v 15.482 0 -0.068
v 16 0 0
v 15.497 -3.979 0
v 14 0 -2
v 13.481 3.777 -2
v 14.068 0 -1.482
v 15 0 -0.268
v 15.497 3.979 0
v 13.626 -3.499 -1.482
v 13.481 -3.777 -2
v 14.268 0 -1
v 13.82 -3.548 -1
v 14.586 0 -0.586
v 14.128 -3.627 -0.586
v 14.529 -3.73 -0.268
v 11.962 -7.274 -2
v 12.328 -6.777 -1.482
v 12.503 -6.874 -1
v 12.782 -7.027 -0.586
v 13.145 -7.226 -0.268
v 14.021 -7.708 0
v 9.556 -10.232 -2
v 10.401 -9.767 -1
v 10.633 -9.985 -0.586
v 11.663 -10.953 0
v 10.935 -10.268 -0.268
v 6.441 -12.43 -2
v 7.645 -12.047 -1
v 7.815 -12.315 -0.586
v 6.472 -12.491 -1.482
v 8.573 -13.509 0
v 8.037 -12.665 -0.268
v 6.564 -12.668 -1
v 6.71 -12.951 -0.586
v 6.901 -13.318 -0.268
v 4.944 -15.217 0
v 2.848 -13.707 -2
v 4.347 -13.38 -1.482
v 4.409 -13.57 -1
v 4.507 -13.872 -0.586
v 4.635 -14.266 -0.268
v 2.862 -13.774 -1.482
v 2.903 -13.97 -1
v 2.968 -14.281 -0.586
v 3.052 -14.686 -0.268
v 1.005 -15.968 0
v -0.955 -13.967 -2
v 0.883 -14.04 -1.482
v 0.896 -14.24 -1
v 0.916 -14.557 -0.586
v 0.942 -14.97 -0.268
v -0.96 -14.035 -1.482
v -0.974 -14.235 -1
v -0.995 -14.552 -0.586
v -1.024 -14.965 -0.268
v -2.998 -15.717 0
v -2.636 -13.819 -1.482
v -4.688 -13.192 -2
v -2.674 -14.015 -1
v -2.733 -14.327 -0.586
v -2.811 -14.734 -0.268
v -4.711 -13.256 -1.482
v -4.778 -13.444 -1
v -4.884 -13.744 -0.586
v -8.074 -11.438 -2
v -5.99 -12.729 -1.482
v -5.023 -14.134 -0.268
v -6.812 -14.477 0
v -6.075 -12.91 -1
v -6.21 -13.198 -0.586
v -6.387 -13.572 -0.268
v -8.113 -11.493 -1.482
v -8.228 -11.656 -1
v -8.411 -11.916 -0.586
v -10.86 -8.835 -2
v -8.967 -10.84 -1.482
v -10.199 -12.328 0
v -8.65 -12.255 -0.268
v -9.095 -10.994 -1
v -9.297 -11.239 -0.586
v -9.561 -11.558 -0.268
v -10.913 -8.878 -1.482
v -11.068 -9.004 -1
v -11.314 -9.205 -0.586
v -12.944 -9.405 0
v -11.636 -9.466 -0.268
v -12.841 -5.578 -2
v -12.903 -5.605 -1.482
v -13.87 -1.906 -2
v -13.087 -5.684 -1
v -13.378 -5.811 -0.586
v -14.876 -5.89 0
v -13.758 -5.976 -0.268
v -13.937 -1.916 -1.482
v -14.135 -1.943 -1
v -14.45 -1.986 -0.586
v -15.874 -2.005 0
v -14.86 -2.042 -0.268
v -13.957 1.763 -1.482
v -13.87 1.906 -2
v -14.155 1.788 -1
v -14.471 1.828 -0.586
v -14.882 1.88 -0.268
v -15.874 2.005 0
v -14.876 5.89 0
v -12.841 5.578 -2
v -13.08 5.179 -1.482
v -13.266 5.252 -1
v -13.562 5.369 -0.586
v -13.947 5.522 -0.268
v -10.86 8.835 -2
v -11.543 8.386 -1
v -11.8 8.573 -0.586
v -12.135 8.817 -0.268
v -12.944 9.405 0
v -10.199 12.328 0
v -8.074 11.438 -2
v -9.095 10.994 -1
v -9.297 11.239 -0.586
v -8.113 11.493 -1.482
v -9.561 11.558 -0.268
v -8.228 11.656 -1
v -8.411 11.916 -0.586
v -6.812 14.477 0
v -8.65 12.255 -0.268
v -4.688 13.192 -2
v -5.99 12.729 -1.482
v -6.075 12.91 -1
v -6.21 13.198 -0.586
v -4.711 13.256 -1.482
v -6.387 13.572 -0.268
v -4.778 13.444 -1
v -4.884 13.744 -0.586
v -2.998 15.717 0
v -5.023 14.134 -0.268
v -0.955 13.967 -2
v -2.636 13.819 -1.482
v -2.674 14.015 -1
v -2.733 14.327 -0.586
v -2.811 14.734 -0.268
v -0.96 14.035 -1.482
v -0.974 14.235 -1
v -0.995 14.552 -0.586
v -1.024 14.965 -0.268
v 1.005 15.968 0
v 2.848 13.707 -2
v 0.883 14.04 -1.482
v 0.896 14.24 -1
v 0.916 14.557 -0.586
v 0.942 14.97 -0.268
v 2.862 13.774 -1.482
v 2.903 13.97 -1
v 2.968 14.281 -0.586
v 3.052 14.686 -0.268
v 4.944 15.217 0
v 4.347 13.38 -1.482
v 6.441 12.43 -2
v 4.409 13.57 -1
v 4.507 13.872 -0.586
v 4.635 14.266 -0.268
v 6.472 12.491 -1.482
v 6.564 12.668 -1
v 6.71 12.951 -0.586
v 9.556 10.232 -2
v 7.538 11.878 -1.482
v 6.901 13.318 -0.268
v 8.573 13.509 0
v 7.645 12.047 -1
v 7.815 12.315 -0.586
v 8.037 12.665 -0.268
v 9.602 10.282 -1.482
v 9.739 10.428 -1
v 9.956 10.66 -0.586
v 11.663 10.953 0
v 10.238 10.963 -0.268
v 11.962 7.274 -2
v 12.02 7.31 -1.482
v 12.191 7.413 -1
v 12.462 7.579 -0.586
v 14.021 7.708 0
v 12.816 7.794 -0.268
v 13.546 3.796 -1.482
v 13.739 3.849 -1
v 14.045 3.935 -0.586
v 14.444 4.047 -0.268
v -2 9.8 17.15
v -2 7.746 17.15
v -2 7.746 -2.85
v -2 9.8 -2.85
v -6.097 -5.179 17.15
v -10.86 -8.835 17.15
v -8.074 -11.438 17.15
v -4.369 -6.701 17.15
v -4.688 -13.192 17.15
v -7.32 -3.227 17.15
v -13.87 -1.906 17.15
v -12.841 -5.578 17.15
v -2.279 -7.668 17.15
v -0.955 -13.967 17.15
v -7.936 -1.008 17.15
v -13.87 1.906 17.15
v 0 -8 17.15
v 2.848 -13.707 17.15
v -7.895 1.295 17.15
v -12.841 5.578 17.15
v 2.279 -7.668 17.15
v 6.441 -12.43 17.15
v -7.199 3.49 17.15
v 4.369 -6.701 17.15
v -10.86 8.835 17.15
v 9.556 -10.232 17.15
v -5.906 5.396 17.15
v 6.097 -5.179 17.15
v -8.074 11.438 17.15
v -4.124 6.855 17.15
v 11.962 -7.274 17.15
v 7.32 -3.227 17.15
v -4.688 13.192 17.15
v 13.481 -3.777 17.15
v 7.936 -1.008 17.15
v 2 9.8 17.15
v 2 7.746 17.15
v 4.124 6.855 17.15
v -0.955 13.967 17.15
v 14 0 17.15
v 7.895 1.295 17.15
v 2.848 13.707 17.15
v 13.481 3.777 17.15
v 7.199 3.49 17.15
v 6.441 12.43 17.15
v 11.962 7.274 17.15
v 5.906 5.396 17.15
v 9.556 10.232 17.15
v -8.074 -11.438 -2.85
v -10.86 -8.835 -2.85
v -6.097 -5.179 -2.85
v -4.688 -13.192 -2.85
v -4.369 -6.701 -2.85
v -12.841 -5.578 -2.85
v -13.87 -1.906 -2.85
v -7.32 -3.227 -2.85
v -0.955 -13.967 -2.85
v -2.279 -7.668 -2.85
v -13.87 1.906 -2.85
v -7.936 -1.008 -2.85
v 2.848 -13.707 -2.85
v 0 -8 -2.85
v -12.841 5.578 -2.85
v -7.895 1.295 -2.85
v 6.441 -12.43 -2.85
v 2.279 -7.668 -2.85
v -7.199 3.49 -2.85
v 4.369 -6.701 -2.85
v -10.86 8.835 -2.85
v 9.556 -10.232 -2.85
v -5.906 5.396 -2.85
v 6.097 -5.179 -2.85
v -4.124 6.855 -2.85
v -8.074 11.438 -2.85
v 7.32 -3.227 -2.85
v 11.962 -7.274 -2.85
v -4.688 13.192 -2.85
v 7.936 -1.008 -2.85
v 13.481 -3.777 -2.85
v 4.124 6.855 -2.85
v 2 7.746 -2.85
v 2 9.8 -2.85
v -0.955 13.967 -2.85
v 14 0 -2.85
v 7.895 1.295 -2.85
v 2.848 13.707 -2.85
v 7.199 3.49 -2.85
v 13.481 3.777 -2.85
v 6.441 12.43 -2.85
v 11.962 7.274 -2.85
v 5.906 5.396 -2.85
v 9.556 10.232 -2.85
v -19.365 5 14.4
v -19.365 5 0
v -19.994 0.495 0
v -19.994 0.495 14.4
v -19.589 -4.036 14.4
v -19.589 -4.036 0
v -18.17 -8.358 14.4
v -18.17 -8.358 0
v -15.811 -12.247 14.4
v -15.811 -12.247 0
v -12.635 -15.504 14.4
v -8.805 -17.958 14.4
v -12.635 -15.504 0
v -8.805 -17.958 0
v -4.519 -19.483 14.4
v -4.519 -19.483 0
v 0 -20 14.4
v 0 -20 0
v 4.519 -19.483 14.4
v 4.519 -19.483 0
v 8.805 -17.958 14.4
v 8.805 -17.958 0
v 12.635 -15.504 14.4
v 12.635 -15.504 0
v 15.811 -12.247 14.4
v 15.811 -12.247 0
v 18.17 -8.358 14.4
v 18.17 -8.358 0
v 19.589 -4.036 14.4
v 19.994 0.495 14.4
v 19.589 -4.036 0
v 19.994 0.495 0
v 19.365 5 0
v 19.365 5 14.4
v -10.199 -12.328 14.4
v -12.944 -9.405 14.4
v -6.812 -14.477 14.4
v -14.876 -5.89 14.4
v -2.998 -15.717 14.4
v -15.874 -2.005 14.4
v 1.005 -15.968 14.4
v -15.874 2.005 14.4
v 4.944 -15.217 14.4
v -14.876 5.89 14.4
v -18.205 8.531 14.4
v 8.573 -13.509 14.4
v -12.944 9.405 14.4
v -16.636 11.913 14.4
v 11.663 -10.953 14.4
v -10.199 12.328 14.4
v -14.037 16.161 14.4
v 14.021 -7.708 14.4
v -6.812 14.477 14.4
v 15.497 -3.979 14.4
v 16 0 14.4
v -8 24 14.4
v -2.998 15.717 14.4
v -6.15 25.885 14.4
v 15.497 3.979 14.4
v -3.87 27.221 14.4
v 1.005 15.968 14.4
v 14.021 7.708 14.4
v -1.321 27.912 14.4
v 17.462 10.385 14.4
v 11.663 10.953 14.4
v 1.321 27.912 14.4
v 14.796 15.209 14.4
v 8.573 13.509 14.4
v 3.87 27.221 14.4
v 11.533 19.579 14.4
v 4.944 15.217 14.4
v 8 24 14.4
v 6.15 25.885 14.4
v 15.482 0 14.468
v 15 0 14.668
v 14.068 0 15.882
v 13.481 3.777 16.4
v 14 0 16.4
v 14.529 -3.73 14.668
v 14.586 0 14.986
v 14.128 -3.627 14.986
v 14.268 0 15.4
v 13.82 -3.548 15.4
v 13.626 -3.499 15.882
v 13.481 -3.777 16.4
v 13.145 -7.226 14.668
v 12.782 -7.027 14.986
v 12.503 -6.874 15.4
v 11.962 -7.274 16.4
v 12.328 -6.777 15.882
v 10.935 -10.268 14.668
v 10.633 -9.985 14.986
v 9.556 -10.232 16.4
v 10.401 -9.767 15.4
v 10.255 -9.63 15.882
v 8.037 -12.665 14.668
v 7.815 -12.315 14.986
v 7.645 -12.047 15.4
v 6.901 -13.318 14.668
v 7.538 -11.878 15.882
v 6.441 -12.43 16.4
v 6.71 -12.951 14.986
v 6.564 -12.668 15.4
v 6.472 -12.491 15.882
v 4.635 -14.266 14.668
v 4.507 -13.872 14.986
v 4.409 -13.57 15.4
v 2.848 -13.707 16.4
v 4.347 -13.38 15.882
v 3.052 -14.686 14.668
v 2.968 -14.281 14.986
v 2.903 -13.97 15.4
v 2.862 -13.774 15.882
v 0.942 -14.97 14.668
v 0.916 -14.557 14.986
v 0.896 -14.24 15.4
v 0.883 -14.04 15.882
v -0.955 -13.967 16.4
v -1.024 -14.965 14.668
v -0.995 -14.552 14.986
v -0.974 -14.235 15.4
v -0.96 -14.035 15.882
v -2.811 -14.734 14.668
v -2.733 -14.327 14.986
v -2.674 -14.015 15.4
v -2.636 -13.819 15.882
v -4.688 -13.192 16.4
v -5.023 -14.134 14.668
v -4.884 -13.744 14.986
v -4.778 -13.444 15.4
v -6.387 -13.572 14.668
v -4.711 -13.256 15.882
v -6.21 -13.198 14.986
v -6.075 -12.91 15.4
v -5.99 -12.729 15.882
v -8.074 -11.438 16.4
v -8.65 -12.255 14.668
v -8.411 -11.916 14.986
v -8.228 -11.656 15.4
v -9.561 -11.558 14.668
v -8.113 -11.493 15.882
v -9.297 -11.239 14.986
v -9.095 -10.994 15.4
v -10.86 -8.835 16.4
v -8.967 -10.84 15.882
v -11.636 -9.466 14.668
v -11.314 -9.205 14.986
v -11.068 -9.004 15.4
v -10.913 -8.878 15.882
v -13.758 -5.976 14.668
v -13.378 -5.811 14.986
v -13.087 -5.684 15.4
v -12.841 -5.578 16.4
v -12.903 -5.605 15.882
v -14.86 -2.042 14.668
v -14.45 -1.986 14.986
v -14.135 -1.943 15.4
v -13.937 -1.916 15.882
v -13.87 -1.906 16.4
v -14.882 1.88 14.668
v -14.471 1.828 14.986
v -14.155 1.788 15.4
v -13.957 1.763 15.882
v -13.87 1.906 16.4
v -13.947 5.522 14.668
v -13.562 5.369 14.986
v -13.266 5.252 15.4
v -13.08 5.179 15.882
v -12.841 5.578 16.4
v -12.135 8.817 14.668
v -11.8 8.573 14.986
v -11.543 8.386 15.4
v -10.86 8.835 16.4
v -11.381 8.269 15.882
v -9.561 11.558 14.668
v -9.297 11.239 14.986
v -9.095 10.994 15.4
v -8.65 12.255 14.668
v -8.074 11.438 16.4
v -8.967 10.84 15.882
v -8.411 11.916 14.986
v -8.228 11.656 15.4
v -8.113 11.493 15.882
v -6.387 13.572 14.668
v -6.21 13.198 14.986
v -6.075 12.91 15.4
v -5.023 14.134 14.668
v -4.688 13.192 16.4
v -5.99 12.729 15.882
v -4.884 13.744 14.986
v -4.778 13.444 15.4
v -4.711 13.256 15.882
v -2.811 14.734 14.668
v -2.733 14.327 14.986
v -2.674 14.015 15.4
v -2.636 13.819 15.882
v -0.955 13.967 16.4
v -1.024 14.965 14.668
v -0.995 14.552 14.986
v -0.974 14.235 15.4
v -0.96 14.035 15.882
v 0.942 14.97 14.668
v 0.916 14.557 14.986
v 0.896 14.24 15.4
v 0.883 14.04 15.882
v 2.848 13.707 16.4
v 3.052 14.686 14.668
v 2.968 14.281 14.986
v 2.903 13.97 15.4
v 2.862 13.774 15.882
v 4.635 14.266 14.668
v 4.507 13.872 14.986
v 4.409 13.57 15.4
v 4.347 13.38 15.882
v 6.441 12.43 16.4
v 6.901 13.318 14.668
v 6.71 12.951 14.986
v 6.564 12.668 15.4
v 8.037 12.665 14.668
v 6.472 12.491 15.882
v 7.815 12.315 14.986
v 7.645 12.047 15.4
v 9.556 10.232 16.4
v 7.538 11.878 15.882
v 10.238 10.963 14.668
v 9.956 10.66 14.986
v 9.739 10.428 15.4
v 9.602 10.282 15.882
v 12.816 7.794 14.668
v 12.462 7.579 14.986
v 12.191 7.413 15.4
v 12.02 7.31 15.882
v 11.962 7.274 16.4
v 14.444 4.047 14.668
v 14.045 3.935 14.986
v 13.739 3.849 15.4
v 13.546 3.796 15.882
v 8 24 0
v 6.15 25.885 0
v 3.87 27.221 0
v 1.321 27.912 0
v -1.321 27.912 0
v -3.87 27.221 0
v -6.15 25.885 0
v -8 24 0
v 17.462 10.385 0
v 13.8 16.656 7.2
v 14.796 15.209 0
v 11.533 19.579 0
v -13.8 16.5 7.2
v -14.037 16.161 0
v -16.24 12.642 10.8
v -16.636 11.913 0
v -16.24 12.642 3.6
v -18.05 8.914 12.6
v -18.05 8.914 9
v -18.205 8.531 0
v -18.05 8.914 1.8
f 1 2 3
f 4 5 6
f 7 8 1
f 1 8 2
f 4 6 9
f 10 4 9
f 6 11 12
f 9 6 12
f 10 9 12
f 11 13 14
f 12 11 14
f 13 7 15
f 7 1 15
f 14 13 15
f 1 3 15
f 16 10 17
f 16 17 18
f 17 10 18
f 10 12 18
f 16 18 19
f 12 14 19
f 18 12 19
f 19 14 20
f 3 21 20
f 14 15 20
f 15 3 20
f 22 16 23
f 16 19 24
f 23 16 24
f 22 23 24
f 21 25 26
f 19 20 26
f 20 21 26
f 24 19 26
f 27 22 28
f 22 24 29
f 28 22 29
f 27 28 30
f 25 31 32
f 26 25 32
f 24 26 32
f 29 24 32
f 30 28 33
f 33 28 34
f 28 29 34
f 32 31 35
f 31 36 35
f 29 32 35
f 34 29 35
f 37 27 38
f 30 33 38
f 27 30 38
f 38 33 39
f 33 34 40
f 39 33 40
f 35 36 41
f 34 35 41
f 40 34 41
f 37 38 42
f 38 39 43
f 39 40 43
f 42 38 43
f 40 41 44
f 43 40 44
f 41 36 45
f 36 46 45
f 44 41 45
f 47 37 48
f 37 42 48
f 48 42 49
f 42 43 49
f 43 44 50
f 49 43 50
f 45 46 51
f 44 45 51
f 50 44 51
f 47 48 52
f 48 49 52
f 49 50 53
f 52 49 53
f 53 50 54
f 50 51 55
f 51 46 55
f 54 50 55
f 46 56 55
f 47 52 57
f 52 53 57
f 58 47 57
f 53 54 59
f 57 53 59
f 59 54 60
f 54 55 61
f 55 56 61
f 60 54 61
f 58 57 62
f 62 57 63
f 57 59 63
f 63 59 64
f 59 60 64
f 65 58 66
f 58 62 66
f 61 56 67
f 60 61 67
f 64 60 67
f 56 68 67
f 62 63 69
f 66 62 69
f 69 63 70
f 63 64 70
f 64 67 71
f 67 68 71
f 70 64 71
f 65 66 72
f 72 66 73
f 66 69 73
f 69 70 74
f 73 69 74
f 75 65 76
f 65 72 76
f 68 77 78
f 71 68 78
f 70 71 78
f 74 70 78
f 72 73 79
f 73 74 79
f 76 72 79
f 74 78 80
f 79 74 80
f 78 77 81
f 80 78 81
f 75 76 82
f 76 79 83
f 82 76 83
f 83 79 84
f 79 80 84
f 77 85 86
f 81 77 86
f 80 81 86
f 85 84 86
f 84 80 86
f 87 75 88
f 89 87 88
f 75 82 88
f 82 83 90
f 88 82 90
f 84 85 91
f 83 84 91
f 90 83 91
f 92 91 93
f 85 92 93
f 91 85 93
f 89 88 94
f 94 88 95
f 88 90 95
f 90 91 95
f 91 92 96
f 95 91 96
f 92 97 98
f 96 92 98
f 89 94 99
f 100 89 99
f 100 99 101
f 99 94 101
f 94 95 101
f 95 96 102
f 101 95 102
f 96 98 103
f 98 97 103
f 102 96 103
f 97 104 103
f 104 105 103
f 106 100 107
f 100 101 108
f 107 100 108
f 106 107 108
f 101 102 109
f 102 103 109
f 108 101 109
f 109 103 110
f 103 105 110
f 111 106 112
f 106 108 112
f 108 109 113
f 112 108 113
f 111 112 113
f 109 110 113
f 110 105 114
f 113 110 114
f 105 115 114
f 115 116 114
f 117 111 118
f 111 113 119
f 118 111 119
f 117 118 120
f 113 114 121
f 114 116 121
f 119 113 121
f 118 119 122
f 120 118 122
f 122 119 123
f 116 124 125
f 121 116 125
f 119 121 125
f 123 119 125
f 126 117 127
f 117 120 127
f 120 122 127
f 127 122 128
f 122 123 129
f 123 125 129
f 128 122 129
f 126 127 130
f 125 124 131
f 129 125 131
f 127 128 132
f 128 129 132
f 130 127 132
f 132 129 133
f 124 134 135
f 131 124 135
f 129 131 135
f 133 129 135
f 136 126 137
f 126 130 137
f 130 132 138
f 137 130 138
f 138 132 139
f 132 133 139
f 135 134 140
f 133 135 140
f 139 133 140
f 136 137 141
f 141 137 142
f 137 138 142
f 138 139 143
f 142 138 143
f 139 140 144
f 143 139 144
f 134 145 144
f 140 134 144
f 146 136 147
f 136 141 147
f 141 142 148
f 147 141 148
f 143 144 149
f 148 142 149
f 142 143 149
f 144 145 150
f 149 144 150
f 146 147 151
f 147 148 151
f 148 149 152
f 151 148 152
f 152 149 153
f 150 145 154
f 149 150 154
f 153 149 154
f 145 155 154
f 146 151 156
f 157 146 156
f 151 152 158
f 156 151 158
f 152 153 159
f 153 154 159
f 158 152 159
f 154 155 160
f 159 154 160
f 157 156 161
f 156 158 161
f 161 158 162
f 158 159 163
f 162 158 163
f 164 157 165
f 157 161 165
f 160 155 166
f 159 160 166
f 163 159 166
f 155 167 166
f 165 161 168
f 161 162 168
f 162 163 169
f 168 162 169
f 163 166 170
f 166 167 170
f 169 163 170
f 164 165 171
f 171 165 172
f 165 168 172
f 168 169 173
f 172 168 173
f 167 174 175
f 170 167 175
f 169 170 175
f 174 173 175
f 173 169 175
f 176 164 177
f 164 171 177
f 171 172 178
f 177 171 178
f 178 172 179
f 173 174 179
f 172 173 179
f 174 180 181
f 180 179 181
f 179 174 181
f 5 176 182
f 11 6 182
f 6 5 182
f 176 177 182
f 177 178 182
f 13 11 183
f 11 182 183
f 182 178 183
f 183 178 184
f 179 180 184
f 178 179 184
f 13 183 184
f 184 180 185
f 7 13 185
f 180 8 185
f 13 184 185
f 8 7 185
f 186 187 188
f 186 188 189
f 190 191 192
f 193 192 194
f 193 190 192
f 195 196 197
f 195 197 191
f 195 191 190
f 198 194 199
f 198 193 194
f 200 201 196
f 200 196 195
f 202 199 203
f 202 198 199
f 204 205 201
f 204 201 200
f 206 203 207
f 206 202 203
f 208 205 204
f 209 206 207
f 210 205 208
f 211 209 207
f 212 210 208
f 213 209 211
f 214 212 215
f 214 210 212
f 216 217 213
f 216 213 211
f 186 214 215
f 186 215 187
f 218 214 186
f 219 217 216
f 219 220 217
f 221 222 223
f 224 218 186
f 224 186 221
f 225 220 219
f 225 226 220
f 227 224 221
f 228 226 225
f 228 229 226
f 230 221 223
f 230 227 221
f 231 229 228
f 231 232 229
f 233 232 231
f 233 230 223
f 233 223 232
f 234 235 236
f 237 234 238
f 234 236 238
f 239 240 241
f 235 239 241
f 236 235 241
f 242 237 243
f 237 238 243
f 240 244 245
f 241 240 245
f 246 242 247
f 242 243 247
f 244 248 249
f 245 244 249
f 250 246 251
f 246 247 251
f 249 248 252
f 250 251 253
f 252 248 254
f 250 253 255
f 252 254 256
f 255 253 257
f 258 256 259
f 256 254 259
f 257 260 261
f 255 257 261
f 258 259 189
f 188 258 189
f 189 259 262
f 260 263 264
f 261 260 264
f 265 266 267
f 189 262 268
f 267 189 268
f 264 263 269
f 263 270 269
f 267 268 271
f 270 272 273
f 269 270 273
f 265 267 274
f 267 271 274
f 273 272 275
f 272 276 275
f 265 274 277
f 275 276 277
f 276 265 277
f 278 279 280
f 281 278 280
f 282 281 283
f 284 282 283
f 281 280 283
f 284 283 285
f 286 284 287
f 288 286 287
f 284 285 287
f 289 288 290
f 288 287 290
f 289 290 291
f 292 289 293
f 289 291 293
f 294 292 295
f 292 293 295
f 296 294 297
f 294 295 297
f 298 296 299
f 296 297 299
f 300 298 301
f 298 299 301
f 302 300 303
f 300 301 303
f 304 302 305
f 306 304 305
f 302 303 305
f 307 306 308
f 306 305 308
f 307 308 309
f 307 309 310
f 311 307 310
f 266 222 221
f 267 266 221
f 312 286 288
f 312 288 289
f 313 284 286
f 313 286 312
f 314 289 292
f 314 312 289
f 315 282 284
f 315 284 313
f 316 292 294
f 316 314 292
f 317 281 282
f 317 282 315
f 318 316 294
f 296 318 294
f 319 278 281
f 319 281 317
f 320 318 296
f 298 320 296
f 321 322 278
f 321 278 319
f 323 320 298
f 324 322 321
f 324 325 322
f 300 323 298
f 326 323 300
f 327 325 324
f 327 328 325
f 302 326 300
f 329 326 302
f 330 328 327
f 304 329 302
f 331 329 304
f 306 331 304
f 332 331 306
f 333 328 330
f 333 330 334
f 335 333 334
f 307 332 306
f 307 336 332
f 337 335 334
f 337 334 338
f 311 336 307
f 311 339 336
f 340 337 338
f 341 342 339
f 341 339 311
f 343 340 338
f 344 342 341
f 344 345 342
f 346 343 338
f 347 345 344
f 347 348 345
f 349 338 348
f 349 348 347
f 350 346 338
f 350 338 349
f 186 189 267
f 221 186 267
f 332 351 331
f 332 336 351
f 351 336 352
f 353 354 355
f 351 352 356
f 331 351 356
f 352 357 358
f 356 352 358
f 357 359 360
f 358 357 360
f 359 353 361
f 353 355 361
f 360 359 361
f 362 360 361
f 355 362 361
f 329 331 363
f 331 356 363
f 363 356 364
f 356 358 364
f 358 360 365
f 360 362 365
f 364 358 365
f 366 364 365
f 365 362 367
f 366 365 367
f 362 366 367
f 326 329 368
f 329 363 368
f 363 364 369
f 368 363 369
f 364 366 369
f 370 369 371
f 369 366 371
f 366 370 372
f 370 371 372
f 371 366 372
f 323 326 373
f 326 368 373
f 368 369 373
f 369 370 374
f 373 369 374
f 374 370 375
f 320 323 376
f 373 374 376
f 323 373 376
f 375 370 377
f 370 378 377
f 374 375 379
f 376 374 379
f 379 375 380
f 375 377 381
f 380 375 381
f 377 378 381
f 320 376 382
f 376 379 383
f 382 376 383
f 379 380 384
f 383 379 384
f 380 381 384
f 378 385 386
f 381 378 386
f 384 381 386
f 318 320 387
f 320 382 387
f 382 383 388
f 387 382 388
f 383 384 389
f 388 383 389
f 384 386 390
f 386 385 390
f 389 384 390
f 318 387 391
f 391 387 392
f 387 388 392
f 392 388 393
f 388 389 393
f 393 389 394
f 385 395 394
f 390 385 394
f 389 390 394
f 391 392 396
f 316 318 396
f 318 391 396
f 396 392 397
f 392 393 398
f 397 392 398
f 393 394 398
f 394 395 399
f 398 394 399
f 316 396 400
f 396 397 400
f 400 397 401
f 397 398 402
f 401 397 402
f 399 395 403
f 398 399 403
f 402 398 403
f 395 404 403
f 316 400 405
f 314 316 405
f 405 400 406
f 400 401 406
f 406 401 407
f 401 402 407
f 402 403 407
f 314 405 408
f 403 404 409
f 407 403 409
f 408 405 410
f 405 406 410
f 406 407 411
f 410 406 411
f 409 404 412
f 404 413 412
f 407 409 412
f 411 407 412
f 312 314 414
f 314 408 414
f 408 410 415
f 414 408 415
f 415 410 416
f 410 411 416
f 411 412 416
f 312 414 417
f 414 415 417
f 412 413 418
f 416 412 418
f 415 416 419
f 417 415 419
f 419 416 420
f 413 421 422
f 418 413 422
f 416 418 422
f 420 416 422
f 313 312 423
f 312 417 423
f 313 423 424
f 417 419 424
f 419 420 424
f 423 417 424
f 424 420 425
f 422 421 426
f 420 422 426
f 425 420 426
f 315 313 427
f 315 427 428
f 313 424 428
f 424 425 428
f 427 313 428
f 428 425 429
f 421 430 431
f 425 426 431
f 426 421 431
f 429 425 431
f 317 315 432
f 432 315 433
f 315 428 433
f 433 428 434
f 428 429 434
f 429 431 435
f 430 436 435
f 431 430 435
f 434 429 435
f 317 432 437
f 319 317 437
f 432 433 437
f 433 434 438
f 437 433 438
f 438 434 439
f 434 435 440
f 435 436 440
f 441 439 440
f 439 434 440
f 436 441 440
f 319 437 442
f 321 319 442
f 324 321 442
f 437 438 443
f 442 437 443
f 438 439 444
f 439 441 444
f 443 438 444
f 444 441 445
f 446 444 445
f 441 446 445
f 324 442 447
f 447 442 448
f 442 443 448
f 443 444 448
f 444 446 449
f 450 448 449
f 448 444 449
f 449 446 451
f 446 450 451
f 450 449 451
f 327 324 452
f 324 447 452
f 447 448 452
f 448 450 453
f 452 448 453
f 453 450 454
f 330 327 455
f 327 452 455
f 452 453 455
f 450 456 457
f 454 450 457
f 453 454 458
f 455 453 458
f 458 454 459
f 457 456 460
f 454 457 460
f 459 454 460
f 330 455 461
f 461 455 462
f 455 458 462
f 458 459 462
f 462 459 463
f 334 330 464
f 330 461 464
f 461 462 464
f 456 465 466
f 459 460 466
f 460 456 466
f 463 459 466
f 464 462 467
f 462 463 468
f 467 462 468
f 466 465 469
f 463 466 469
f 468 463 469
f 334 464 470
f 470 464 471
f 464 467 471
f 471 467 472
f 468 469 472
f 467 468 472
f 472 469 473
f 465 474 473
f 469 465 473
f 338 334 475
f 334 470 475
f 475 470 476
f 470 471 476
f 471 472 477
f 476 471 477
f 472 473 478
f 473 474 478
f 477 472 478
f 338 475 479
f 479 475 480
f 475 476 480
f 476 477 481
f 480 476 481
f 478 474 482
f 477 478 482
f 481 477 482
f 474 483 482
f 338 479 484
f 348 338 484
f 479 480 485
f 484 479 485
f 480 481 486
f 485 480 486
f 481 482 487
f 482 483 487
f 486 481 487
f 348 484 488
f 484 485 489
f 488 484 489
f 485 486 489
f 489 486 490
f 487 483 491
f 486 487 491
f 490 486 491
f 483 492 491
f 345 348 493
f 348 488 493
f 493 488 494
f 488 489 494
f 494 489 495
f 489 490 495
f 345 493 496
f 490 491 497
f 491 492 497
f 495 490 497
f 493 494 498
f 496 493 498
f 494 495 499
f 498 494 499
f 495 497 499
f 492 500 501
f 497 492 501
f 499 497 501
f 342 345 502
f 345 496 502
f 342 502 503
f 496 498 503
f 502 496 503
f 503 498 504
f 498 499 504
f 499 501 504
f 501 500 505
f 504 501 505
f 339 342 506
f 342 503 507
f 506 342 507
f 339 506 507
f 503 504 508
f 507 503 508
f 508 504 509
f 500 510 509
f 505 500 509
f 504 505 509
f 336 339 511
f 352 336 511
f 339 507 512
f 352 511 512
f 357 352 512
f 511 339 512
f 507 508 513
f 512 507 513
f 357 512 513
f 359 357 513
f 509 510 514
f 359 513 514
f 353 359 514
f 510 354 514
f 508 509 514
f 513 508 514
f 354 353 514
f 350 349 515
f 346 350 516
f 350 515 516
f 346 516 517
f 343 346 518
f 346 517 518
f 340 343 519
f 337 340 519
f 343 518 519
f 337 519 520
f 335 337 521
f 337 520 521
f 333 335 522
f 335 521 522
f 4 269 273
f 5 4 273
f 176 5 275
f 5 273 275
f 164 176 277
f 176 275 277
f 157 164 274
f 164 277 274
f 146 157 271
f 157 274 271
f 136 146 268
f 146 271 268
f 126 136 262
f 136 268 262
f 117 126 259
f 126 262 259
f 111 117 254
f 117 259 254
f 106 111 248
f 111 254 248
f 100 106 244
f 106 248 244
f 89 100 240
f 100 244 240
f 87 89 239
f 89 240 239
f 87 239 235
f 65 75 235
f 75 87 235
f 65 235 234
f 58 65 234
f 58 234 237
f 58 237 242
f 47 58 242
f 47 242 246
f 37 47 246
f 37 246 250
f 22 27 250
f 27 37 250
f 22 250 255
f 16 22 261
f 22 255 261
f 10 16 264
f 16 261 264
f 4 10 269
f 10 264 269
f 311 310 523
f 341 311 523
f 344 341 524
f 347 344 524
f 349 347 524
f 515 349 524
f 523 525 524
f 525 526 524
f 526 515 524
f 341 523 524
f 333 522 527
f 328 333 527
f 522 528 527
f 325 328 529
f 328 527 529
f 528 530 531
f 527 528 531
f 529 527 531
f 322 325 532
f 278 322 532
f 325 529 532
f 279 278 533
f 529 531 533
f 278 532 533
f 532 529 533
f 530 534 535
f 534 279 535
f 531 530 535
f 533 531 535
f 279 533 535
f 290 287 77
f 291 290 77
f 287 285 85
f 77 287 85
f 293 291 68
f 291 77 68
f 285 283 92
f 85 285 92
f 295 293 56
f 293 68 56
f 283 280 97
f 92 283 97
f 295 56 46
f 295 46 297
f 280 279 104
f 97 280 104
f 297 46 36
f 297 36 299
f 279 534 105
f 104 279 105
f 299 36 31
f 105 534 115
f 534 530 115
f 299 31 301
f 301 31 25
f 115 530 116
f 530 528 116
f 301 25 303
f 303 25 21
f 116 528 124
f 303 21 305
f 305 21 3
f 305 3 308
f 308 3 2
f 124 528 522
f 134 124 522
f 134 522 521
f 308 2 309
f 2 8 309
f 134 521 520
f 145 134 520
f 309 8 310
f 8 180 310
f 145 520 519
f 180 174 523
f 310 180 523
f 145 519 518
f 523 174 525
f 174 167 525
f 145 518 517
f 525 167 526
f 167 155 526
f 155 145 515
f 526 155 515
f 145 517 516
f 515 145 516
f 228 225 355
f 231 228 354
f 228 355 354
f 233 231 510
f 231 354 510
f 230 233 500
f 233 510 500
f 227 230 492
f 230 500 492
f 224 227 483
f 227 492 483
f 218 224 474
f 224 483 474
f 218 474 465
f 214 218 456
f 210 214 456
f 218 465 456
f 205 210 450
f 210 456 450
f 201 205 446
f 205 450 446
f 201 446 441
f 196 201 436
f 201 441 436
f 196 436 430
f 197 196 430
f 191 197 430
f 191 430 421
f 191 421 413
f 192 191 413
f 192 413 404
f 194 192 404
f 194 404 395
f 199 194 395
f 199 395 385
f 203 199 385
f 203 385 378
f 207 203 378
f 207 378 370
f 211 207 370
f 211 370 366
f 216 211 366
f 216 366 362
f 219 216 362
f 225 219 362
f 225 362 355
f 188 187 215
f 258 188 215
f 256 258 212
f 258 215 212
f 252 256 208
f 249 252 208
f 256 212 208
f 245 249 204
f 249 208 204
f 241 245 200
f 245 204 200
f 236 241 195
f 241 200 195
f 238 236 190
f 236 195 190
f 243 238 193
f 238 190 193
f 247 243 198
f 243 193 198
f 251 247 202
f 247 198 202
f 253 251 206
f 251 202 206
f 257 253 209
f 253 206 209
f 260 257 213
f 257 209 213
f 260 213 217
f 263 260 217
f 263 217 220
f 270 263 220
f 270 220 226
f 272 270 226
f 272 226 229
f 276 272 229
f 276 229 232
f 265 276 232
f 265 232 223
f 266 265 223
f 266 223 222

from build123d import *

# Parameters (mm, degrees)
CAMBODY_DEPTH   = 14.4
BOSS_DEPTH      = 2.75
BOSS_DEPTH_BACK = 17.25
SKETCH2_R       = 14
BOSSFILLETS_R   = 2
SKETCH3_R       = 8
BORE_DEPTH      = 40.799497605
SKETCH4_W       = 4
SKETCH4_H       = 5
KEYSLOT_DEPTH   = 40.799497605


with BuildPart() as part:
    # Sketch1 → CamBody (new body)
    with BuildSketch(Plane.XY):
        with BuildLine():
            ThreePointArc((8, 24), (0, 28), (-8, 24))
            add(Edge.make_bspline(
                [(-8, 24), (-9.885763615, 21.485648513), (-14.768346923, 15.874245369), (-18.297603119, 9.133687845), (-19.364916731, 5)],
                knots=[0, 0, 0, 0, 0.425985114, 1, 1, 1, 1], degree=3))
            ThreePointArc((-19.364916731, 5), (0, -20), (19.364916731, 5))
            add(Edge.make_bspline(
                [(19.364916731, 5), (18.228780394, 9.400237112), (14.835269856, 16.032711081), (9.974620681, 21.367172425), (8, 24)],
                knots=[0, 0, 0, 0, 0.579854245, 1, 1, 1, 1], degree=3))
        make_face()
    extrude(amount=CAMBODY_DEPTH)

    # Sketch2 → Boss (add, two sides: drawn at the far end of the back side and taken through both)
    with BuildSketch(Plane.XY.offset(14.4).offset(-BOSS_DEPTH_BACK)):
        Circle(SKETCH2_R)
    extrude(amount=BOSS_DEPTH + BOSS_DEPTH_BACK)

    # BossFillets
    bossfillets_edges = [part.edges().sort_by_distance(p)[0] for p in [
        (-14, 0, 0),
        (-14, 0, 14.4),
    ]]
    fillet(bossfillets_edges, radius=BOSSFILLETS_R)

    # Sketch3 → Bore (cut, through all)
    with BuildSketch(Plane.XY.offset(17.15)):
        Circle(SKETCH3_R)
    extrude(amount=-BORE_DEPTH, mode=Mode.SUBTRACT)

    # Sketch4 → KeySlot (cut, through all)
    with BuildSketch(Plane.XY.offset(17.15)):
        with Locations((0, 7.3)):
            Rectangle(SKETCH4_W, SKETCH4_H)
    extrude(amount=-KEYSLOT_DEPTH, mode=Mode.SUBTRACT)


solid = part.part
